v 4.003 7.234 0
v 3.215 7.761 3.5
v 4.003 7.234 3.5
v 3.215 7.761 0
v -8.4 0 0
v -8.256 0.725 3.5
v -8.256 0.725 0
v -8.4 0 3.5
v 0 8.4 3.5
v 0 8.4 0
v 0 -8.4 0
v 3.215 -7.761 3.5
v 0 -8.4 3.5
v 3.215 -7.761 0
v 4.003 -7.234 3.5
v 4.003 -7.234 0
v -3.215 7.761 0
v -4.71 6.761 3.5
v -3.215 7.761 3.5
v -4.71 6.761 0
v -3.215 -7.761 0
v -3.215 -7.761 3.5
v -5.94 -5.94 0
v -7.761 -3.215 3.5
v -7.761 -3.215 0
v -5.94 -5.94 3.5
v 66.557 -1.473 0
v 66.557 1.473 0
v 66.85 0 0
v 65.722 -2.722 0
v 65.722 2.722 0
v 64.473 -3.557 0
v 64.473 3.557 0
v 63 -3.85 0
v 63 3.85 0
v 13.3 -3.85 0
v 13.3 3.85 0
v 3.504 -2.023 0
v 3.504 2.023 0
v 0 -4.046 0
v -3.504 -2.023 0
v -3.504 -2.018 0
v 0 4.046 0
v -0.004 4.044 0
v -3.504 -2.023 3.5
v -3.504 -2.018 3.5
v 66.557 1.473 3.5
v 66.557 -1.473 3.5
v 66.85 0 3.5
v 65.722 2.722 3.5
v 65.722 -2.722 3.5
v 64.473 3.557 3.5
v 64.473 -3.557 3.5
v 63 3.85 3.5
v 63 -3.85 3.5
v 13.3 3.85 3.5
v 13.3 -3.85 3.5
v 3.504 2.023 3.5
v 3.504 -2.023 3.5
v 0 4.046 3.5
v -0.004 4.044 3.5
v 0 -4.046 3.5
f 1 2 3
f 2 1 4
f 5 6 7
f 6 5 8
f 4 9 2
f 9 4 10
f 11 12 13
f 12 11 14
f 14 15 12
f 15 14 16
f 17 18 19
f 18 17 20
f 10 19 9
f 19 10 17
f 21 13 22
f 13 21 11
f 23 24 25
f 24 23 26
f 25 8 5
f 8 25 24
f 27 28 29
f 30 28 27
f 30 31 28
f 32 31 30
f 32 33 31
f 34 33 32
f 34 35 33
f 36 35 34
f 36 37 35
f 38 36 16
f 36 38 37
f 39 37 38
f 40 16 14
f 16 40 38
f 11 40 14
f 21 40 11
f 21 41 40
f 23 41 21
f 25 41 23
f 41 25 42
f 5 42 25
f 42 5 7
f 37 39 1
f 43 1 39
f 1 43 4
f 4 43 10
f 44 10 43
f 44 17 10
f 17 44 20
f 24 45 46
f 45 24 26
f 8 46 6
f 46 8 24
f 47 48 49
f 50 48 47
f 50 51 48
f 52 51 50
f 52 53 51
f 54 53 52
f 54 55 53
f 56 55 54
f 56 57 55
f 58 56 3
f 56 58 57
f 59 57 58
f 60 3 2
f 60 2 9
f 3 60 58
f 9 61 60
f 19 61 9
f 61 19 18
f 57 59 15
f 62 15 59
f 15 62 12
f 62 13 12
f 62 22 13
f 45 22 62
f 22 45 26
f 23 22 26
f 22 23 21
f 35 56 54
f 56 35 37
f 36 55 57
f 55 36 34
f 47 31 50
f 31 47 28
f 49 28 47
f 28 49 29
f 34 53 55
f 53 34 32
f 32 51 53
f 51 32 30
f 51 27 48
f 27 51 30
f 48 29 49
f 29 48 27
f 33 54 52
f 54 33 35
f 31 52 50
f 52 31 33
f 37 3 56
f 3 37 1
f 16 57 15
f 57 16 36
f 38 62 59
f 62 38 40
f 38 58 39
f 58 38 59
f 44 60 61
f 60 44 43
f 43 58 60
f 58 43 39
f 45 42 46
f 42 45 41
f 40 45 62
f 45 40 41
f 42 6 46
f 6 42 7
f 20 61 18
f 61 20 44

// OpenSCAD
size = 7;
dia = 7;
height = dia/2;

difference() {
	union() {
		cylinder(h = height, r = dia*1.2, $fn = 16);
		translate([0,-dia*1.1/2,0]) cube(size = [dia*9,dia*1.1,height]);
		translate([dia*9,0,0]) cylinder(h = height, r = dia*1.1/2, $fn = 16);
		rotate([0, 0, 70]) translate([dia/6, -dia*2, 0]) cube(size = [dia,dia*2,height]);
		rotate([0, 0, -70]) translate([dia/6, 0, 0]) cube(size = [dia,dia*2,height]);
	}
	union() {
		rotate([0, 0, 360/12]) {
			cylinder(h = 20, r = (dia/2)*1.156, $fn = 6, center = true);
			rotate([0, 0, 360/12]) translate([-dia/2, 0, -1]) cube(size = [dia,80,50]);
		}
	}
}
